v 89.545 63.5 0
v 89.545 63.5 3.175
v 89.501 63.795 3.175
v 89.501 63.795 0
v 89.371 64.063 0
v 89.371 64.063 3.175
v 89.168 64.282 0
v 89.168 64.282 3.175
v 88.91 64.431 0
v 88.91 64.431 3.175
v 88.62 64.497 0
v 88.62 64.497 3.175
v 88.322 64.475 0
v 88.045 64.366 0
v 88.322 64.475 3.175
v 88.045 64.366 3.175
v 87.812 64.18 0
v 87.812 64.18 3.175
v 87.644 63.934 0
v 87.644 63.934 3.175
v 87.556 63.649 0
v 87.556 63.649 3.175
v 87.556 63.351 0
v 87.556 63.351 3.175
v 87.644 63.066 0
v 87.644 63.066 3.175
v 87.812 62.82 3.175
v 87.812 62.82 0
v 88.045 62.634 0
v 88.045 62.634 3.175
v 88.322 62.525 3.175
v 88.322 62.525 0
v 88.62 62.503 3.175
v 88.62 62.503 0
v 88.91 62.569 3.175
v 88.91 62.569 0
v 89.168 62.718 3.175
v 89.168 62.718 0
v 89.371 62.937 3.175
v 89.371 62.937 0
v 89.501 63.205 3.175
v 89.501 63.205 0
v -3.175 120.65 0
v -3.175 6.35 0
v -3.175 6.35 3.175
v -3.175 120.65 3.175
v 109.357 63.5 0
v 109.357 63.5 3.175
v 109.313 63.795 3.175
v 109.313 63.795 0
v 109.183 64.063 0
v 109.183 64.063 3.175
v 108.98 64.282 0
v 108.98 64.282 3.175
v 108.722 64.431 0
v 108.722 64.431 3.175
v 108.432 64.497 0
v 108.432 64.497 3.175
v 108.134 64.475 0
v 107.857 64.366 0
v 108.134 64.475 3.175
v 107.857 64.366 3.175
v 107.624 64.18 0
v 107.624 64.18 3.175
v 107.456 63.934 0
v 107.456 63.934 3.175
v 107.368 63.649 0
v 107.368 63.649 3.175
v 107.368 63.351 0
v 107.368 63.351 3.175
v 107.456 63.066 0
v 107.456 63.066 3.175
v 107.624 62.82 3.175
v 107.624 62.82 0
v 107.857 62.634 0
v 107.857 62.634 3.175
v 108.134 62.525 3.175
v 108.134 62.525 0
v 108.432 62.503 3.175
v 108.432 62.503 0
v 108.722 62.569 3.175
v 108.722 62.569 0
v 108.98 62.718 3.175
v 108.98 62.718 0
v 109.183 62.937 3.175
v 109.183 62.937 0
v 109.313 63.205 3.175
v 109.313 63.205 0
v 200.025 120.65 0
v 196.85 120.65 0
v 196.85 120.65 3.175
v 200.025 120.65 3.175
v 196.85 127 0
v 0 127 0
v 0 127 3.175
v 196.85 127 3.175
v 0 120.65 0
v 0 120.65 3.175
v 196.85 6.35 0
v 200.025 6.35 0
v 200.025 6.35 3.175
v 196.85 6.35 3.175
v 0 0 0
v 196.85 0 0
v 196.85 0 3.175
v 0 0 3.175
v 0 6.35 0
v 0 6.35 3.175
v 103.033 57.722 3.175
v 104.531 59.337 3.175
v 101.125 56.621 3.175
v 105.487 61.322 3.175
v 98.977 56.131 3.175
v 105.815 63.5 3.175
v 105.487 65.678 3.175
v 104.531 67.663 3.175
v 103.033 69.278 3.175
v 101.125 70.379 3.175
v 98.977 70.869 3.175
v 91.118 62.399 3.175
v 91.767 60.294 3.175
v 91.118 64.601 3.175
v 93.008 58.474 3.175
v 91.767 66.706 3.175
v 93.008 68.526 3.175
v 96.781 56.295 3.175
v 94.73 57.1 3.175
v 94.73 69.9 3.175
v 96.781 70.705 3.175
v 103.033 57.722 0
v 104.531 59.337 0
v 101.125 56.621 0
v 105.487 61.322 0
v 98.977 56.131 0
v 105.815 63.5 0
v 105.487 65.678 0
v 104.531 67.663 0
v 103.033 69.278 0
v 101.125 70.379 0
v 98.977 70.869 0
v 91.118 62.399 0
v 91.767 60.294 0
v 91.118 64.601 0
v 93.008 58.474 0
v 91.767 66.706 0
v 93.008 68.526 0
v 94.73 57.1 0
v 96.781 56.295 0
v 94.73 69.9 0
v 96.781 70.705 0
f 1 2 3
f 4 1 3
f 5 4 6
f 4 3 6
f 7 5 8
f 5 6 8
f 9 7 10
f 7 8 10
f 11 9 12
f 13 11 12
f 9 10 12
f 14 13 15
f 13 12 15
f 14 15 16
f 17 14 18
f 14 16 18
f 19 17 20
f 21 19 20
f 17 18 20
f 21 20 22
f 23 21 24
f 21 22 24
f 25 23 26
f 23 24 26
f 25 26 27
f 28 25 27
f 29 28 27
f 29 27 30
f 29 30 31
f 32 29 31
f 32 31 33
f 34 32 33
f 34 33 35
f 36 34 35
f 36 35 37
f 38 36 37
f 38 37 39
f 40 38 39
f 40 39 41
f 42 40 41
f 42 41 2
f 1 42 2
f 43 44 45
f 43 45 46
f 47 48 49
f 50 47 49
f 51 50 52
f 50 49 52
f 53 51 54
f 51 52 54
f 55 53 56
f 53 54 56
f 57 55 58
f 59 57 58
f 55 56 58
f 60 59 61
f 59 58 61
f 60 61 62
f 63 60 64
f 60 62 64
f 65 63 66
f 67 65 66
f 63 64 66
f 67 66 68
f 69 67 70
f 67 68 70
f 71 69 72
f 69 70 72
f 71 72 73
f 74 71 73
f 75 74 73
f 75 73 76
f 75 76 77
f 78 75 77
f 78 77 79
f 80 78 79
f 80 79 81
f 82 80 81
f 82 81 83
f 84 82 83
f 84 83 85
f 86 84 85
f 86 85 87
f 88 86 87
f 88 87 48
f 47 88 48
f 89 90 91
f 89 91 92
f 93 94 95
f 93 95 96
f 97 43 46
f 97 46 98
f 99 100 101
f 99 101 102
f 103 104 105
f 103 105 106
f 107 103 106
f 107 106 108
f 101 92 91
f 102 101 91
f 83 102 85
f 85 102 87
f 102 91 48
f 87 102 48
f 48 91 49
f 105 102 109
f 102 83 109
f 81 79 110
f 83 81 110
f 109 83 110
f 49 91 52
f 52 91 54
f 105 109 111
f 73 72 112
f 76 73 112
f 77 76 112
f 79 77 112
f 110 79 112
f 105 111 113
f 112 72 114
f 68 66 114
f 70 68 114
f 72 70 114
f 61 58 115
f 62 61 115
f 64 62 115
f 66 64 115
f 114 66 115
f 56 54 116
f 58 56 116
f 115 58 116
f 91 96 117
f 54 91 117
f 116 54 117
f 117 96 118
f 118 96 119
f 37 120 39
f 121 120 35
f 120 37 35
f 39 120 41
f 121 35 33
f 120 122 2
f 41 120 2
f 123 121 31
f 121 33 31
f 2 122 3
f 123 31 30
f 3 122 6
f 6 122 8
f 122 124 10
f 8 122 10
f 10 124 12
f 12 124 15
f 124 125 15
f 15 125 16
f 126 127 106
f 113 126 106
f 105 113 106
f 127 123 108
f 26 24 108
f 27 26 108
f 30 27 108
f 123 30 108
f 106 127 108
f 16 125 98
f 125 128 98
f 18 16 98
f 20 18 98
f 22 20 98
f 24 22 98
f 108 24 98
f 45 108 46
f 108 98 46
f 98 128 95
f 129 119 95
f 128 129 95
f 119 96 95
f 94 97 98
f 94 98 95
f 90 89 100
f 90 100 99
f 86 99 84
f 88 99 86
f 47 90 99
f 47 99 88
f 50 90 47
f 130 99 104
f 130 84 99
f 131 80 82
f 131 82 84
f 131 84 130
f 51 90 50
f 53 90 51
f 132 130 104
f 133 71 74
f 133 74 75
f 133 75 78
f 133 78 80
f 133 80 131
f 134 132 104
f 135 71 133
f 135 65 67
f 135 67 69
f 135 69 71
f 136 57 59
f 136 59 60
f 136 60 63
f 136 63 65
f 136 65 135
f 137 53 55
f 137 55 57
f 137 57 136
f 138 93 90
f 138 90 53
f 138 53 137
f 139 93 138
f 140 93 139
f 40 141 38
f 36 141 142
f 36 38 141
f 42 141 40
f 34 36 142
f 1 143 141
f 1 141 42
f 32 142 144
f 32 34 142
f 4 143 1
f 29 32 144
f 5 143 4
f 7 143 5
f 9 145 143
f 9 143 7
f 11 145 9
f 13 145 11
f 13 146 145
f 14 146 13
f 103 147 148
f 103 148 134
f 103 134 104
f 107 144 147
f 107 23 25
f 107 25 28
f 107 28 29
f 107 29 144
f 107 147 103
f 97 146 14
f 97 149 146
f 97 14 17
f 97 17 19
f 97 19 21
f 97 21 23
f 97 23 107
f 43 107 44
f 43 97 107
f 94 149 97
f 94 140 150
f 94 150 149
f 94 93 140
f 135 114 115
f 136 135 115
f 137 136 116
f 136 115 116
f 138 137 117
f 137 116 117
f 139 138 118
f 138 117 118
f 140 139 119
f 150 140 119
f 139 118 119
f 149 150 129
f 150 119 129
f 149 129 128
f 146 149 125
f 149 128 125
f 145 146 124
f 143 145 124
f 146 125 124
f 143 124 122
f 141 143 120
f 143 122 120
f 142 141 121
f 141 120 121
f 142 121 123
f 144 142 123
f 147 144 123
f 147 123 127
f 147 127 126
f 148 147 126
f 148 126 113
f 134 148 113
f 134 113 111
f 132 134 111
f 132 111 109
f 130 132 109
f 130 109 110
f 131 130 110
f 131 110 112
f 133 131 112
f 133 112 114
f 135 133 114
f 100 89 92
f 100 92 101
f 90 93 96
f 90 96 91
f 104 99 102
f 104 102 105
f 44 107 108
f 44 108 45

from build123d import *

# Parameters (mm, degrees)
BOSS_EXTRUDE1_DEPTH = 3.175
SKETCH3_R           = 7.39
SKETCH3_R_2         = 1
CUT_EXTRUDE1_DEPTH  = 4.175


with BuildPart() as part:
    # Sketch2 → Boss-Extrude1 (new body)
    with BuildSketch(Plane.XY):
        Polygon((0, 120.65), (0, 127), (196.85, 127), (196.85, 120.65), (200.025, 120.65), (200.025, 6.35), (196.85, 6.35), (196.85, 0), (0, 0), (0, 6.35), (-3.175, 6.35), (-3.175, 120.65), align=None)
    extrude(amount=BOSS_EXTRUDE1_DEPTH)

    # Sketch3 → Cut-Extrude1 (cut, through all)
    with BuildSketch(Plane.XY.offset(3.175)):
        with Locations((98.425, 63.5)):
            Circle(SKETCH3_R)
        with Locations((88.545, 63.5)):
            Circle(SKETCH3_R_2)
        with Locations((108.357, 63.5)):
            Circle(SKETCH3_R_2)
    extrude(amount=-CUT_EXTRUDE1_DEPTH, mode=Mode.SUBTRACT)


solid = part.part
